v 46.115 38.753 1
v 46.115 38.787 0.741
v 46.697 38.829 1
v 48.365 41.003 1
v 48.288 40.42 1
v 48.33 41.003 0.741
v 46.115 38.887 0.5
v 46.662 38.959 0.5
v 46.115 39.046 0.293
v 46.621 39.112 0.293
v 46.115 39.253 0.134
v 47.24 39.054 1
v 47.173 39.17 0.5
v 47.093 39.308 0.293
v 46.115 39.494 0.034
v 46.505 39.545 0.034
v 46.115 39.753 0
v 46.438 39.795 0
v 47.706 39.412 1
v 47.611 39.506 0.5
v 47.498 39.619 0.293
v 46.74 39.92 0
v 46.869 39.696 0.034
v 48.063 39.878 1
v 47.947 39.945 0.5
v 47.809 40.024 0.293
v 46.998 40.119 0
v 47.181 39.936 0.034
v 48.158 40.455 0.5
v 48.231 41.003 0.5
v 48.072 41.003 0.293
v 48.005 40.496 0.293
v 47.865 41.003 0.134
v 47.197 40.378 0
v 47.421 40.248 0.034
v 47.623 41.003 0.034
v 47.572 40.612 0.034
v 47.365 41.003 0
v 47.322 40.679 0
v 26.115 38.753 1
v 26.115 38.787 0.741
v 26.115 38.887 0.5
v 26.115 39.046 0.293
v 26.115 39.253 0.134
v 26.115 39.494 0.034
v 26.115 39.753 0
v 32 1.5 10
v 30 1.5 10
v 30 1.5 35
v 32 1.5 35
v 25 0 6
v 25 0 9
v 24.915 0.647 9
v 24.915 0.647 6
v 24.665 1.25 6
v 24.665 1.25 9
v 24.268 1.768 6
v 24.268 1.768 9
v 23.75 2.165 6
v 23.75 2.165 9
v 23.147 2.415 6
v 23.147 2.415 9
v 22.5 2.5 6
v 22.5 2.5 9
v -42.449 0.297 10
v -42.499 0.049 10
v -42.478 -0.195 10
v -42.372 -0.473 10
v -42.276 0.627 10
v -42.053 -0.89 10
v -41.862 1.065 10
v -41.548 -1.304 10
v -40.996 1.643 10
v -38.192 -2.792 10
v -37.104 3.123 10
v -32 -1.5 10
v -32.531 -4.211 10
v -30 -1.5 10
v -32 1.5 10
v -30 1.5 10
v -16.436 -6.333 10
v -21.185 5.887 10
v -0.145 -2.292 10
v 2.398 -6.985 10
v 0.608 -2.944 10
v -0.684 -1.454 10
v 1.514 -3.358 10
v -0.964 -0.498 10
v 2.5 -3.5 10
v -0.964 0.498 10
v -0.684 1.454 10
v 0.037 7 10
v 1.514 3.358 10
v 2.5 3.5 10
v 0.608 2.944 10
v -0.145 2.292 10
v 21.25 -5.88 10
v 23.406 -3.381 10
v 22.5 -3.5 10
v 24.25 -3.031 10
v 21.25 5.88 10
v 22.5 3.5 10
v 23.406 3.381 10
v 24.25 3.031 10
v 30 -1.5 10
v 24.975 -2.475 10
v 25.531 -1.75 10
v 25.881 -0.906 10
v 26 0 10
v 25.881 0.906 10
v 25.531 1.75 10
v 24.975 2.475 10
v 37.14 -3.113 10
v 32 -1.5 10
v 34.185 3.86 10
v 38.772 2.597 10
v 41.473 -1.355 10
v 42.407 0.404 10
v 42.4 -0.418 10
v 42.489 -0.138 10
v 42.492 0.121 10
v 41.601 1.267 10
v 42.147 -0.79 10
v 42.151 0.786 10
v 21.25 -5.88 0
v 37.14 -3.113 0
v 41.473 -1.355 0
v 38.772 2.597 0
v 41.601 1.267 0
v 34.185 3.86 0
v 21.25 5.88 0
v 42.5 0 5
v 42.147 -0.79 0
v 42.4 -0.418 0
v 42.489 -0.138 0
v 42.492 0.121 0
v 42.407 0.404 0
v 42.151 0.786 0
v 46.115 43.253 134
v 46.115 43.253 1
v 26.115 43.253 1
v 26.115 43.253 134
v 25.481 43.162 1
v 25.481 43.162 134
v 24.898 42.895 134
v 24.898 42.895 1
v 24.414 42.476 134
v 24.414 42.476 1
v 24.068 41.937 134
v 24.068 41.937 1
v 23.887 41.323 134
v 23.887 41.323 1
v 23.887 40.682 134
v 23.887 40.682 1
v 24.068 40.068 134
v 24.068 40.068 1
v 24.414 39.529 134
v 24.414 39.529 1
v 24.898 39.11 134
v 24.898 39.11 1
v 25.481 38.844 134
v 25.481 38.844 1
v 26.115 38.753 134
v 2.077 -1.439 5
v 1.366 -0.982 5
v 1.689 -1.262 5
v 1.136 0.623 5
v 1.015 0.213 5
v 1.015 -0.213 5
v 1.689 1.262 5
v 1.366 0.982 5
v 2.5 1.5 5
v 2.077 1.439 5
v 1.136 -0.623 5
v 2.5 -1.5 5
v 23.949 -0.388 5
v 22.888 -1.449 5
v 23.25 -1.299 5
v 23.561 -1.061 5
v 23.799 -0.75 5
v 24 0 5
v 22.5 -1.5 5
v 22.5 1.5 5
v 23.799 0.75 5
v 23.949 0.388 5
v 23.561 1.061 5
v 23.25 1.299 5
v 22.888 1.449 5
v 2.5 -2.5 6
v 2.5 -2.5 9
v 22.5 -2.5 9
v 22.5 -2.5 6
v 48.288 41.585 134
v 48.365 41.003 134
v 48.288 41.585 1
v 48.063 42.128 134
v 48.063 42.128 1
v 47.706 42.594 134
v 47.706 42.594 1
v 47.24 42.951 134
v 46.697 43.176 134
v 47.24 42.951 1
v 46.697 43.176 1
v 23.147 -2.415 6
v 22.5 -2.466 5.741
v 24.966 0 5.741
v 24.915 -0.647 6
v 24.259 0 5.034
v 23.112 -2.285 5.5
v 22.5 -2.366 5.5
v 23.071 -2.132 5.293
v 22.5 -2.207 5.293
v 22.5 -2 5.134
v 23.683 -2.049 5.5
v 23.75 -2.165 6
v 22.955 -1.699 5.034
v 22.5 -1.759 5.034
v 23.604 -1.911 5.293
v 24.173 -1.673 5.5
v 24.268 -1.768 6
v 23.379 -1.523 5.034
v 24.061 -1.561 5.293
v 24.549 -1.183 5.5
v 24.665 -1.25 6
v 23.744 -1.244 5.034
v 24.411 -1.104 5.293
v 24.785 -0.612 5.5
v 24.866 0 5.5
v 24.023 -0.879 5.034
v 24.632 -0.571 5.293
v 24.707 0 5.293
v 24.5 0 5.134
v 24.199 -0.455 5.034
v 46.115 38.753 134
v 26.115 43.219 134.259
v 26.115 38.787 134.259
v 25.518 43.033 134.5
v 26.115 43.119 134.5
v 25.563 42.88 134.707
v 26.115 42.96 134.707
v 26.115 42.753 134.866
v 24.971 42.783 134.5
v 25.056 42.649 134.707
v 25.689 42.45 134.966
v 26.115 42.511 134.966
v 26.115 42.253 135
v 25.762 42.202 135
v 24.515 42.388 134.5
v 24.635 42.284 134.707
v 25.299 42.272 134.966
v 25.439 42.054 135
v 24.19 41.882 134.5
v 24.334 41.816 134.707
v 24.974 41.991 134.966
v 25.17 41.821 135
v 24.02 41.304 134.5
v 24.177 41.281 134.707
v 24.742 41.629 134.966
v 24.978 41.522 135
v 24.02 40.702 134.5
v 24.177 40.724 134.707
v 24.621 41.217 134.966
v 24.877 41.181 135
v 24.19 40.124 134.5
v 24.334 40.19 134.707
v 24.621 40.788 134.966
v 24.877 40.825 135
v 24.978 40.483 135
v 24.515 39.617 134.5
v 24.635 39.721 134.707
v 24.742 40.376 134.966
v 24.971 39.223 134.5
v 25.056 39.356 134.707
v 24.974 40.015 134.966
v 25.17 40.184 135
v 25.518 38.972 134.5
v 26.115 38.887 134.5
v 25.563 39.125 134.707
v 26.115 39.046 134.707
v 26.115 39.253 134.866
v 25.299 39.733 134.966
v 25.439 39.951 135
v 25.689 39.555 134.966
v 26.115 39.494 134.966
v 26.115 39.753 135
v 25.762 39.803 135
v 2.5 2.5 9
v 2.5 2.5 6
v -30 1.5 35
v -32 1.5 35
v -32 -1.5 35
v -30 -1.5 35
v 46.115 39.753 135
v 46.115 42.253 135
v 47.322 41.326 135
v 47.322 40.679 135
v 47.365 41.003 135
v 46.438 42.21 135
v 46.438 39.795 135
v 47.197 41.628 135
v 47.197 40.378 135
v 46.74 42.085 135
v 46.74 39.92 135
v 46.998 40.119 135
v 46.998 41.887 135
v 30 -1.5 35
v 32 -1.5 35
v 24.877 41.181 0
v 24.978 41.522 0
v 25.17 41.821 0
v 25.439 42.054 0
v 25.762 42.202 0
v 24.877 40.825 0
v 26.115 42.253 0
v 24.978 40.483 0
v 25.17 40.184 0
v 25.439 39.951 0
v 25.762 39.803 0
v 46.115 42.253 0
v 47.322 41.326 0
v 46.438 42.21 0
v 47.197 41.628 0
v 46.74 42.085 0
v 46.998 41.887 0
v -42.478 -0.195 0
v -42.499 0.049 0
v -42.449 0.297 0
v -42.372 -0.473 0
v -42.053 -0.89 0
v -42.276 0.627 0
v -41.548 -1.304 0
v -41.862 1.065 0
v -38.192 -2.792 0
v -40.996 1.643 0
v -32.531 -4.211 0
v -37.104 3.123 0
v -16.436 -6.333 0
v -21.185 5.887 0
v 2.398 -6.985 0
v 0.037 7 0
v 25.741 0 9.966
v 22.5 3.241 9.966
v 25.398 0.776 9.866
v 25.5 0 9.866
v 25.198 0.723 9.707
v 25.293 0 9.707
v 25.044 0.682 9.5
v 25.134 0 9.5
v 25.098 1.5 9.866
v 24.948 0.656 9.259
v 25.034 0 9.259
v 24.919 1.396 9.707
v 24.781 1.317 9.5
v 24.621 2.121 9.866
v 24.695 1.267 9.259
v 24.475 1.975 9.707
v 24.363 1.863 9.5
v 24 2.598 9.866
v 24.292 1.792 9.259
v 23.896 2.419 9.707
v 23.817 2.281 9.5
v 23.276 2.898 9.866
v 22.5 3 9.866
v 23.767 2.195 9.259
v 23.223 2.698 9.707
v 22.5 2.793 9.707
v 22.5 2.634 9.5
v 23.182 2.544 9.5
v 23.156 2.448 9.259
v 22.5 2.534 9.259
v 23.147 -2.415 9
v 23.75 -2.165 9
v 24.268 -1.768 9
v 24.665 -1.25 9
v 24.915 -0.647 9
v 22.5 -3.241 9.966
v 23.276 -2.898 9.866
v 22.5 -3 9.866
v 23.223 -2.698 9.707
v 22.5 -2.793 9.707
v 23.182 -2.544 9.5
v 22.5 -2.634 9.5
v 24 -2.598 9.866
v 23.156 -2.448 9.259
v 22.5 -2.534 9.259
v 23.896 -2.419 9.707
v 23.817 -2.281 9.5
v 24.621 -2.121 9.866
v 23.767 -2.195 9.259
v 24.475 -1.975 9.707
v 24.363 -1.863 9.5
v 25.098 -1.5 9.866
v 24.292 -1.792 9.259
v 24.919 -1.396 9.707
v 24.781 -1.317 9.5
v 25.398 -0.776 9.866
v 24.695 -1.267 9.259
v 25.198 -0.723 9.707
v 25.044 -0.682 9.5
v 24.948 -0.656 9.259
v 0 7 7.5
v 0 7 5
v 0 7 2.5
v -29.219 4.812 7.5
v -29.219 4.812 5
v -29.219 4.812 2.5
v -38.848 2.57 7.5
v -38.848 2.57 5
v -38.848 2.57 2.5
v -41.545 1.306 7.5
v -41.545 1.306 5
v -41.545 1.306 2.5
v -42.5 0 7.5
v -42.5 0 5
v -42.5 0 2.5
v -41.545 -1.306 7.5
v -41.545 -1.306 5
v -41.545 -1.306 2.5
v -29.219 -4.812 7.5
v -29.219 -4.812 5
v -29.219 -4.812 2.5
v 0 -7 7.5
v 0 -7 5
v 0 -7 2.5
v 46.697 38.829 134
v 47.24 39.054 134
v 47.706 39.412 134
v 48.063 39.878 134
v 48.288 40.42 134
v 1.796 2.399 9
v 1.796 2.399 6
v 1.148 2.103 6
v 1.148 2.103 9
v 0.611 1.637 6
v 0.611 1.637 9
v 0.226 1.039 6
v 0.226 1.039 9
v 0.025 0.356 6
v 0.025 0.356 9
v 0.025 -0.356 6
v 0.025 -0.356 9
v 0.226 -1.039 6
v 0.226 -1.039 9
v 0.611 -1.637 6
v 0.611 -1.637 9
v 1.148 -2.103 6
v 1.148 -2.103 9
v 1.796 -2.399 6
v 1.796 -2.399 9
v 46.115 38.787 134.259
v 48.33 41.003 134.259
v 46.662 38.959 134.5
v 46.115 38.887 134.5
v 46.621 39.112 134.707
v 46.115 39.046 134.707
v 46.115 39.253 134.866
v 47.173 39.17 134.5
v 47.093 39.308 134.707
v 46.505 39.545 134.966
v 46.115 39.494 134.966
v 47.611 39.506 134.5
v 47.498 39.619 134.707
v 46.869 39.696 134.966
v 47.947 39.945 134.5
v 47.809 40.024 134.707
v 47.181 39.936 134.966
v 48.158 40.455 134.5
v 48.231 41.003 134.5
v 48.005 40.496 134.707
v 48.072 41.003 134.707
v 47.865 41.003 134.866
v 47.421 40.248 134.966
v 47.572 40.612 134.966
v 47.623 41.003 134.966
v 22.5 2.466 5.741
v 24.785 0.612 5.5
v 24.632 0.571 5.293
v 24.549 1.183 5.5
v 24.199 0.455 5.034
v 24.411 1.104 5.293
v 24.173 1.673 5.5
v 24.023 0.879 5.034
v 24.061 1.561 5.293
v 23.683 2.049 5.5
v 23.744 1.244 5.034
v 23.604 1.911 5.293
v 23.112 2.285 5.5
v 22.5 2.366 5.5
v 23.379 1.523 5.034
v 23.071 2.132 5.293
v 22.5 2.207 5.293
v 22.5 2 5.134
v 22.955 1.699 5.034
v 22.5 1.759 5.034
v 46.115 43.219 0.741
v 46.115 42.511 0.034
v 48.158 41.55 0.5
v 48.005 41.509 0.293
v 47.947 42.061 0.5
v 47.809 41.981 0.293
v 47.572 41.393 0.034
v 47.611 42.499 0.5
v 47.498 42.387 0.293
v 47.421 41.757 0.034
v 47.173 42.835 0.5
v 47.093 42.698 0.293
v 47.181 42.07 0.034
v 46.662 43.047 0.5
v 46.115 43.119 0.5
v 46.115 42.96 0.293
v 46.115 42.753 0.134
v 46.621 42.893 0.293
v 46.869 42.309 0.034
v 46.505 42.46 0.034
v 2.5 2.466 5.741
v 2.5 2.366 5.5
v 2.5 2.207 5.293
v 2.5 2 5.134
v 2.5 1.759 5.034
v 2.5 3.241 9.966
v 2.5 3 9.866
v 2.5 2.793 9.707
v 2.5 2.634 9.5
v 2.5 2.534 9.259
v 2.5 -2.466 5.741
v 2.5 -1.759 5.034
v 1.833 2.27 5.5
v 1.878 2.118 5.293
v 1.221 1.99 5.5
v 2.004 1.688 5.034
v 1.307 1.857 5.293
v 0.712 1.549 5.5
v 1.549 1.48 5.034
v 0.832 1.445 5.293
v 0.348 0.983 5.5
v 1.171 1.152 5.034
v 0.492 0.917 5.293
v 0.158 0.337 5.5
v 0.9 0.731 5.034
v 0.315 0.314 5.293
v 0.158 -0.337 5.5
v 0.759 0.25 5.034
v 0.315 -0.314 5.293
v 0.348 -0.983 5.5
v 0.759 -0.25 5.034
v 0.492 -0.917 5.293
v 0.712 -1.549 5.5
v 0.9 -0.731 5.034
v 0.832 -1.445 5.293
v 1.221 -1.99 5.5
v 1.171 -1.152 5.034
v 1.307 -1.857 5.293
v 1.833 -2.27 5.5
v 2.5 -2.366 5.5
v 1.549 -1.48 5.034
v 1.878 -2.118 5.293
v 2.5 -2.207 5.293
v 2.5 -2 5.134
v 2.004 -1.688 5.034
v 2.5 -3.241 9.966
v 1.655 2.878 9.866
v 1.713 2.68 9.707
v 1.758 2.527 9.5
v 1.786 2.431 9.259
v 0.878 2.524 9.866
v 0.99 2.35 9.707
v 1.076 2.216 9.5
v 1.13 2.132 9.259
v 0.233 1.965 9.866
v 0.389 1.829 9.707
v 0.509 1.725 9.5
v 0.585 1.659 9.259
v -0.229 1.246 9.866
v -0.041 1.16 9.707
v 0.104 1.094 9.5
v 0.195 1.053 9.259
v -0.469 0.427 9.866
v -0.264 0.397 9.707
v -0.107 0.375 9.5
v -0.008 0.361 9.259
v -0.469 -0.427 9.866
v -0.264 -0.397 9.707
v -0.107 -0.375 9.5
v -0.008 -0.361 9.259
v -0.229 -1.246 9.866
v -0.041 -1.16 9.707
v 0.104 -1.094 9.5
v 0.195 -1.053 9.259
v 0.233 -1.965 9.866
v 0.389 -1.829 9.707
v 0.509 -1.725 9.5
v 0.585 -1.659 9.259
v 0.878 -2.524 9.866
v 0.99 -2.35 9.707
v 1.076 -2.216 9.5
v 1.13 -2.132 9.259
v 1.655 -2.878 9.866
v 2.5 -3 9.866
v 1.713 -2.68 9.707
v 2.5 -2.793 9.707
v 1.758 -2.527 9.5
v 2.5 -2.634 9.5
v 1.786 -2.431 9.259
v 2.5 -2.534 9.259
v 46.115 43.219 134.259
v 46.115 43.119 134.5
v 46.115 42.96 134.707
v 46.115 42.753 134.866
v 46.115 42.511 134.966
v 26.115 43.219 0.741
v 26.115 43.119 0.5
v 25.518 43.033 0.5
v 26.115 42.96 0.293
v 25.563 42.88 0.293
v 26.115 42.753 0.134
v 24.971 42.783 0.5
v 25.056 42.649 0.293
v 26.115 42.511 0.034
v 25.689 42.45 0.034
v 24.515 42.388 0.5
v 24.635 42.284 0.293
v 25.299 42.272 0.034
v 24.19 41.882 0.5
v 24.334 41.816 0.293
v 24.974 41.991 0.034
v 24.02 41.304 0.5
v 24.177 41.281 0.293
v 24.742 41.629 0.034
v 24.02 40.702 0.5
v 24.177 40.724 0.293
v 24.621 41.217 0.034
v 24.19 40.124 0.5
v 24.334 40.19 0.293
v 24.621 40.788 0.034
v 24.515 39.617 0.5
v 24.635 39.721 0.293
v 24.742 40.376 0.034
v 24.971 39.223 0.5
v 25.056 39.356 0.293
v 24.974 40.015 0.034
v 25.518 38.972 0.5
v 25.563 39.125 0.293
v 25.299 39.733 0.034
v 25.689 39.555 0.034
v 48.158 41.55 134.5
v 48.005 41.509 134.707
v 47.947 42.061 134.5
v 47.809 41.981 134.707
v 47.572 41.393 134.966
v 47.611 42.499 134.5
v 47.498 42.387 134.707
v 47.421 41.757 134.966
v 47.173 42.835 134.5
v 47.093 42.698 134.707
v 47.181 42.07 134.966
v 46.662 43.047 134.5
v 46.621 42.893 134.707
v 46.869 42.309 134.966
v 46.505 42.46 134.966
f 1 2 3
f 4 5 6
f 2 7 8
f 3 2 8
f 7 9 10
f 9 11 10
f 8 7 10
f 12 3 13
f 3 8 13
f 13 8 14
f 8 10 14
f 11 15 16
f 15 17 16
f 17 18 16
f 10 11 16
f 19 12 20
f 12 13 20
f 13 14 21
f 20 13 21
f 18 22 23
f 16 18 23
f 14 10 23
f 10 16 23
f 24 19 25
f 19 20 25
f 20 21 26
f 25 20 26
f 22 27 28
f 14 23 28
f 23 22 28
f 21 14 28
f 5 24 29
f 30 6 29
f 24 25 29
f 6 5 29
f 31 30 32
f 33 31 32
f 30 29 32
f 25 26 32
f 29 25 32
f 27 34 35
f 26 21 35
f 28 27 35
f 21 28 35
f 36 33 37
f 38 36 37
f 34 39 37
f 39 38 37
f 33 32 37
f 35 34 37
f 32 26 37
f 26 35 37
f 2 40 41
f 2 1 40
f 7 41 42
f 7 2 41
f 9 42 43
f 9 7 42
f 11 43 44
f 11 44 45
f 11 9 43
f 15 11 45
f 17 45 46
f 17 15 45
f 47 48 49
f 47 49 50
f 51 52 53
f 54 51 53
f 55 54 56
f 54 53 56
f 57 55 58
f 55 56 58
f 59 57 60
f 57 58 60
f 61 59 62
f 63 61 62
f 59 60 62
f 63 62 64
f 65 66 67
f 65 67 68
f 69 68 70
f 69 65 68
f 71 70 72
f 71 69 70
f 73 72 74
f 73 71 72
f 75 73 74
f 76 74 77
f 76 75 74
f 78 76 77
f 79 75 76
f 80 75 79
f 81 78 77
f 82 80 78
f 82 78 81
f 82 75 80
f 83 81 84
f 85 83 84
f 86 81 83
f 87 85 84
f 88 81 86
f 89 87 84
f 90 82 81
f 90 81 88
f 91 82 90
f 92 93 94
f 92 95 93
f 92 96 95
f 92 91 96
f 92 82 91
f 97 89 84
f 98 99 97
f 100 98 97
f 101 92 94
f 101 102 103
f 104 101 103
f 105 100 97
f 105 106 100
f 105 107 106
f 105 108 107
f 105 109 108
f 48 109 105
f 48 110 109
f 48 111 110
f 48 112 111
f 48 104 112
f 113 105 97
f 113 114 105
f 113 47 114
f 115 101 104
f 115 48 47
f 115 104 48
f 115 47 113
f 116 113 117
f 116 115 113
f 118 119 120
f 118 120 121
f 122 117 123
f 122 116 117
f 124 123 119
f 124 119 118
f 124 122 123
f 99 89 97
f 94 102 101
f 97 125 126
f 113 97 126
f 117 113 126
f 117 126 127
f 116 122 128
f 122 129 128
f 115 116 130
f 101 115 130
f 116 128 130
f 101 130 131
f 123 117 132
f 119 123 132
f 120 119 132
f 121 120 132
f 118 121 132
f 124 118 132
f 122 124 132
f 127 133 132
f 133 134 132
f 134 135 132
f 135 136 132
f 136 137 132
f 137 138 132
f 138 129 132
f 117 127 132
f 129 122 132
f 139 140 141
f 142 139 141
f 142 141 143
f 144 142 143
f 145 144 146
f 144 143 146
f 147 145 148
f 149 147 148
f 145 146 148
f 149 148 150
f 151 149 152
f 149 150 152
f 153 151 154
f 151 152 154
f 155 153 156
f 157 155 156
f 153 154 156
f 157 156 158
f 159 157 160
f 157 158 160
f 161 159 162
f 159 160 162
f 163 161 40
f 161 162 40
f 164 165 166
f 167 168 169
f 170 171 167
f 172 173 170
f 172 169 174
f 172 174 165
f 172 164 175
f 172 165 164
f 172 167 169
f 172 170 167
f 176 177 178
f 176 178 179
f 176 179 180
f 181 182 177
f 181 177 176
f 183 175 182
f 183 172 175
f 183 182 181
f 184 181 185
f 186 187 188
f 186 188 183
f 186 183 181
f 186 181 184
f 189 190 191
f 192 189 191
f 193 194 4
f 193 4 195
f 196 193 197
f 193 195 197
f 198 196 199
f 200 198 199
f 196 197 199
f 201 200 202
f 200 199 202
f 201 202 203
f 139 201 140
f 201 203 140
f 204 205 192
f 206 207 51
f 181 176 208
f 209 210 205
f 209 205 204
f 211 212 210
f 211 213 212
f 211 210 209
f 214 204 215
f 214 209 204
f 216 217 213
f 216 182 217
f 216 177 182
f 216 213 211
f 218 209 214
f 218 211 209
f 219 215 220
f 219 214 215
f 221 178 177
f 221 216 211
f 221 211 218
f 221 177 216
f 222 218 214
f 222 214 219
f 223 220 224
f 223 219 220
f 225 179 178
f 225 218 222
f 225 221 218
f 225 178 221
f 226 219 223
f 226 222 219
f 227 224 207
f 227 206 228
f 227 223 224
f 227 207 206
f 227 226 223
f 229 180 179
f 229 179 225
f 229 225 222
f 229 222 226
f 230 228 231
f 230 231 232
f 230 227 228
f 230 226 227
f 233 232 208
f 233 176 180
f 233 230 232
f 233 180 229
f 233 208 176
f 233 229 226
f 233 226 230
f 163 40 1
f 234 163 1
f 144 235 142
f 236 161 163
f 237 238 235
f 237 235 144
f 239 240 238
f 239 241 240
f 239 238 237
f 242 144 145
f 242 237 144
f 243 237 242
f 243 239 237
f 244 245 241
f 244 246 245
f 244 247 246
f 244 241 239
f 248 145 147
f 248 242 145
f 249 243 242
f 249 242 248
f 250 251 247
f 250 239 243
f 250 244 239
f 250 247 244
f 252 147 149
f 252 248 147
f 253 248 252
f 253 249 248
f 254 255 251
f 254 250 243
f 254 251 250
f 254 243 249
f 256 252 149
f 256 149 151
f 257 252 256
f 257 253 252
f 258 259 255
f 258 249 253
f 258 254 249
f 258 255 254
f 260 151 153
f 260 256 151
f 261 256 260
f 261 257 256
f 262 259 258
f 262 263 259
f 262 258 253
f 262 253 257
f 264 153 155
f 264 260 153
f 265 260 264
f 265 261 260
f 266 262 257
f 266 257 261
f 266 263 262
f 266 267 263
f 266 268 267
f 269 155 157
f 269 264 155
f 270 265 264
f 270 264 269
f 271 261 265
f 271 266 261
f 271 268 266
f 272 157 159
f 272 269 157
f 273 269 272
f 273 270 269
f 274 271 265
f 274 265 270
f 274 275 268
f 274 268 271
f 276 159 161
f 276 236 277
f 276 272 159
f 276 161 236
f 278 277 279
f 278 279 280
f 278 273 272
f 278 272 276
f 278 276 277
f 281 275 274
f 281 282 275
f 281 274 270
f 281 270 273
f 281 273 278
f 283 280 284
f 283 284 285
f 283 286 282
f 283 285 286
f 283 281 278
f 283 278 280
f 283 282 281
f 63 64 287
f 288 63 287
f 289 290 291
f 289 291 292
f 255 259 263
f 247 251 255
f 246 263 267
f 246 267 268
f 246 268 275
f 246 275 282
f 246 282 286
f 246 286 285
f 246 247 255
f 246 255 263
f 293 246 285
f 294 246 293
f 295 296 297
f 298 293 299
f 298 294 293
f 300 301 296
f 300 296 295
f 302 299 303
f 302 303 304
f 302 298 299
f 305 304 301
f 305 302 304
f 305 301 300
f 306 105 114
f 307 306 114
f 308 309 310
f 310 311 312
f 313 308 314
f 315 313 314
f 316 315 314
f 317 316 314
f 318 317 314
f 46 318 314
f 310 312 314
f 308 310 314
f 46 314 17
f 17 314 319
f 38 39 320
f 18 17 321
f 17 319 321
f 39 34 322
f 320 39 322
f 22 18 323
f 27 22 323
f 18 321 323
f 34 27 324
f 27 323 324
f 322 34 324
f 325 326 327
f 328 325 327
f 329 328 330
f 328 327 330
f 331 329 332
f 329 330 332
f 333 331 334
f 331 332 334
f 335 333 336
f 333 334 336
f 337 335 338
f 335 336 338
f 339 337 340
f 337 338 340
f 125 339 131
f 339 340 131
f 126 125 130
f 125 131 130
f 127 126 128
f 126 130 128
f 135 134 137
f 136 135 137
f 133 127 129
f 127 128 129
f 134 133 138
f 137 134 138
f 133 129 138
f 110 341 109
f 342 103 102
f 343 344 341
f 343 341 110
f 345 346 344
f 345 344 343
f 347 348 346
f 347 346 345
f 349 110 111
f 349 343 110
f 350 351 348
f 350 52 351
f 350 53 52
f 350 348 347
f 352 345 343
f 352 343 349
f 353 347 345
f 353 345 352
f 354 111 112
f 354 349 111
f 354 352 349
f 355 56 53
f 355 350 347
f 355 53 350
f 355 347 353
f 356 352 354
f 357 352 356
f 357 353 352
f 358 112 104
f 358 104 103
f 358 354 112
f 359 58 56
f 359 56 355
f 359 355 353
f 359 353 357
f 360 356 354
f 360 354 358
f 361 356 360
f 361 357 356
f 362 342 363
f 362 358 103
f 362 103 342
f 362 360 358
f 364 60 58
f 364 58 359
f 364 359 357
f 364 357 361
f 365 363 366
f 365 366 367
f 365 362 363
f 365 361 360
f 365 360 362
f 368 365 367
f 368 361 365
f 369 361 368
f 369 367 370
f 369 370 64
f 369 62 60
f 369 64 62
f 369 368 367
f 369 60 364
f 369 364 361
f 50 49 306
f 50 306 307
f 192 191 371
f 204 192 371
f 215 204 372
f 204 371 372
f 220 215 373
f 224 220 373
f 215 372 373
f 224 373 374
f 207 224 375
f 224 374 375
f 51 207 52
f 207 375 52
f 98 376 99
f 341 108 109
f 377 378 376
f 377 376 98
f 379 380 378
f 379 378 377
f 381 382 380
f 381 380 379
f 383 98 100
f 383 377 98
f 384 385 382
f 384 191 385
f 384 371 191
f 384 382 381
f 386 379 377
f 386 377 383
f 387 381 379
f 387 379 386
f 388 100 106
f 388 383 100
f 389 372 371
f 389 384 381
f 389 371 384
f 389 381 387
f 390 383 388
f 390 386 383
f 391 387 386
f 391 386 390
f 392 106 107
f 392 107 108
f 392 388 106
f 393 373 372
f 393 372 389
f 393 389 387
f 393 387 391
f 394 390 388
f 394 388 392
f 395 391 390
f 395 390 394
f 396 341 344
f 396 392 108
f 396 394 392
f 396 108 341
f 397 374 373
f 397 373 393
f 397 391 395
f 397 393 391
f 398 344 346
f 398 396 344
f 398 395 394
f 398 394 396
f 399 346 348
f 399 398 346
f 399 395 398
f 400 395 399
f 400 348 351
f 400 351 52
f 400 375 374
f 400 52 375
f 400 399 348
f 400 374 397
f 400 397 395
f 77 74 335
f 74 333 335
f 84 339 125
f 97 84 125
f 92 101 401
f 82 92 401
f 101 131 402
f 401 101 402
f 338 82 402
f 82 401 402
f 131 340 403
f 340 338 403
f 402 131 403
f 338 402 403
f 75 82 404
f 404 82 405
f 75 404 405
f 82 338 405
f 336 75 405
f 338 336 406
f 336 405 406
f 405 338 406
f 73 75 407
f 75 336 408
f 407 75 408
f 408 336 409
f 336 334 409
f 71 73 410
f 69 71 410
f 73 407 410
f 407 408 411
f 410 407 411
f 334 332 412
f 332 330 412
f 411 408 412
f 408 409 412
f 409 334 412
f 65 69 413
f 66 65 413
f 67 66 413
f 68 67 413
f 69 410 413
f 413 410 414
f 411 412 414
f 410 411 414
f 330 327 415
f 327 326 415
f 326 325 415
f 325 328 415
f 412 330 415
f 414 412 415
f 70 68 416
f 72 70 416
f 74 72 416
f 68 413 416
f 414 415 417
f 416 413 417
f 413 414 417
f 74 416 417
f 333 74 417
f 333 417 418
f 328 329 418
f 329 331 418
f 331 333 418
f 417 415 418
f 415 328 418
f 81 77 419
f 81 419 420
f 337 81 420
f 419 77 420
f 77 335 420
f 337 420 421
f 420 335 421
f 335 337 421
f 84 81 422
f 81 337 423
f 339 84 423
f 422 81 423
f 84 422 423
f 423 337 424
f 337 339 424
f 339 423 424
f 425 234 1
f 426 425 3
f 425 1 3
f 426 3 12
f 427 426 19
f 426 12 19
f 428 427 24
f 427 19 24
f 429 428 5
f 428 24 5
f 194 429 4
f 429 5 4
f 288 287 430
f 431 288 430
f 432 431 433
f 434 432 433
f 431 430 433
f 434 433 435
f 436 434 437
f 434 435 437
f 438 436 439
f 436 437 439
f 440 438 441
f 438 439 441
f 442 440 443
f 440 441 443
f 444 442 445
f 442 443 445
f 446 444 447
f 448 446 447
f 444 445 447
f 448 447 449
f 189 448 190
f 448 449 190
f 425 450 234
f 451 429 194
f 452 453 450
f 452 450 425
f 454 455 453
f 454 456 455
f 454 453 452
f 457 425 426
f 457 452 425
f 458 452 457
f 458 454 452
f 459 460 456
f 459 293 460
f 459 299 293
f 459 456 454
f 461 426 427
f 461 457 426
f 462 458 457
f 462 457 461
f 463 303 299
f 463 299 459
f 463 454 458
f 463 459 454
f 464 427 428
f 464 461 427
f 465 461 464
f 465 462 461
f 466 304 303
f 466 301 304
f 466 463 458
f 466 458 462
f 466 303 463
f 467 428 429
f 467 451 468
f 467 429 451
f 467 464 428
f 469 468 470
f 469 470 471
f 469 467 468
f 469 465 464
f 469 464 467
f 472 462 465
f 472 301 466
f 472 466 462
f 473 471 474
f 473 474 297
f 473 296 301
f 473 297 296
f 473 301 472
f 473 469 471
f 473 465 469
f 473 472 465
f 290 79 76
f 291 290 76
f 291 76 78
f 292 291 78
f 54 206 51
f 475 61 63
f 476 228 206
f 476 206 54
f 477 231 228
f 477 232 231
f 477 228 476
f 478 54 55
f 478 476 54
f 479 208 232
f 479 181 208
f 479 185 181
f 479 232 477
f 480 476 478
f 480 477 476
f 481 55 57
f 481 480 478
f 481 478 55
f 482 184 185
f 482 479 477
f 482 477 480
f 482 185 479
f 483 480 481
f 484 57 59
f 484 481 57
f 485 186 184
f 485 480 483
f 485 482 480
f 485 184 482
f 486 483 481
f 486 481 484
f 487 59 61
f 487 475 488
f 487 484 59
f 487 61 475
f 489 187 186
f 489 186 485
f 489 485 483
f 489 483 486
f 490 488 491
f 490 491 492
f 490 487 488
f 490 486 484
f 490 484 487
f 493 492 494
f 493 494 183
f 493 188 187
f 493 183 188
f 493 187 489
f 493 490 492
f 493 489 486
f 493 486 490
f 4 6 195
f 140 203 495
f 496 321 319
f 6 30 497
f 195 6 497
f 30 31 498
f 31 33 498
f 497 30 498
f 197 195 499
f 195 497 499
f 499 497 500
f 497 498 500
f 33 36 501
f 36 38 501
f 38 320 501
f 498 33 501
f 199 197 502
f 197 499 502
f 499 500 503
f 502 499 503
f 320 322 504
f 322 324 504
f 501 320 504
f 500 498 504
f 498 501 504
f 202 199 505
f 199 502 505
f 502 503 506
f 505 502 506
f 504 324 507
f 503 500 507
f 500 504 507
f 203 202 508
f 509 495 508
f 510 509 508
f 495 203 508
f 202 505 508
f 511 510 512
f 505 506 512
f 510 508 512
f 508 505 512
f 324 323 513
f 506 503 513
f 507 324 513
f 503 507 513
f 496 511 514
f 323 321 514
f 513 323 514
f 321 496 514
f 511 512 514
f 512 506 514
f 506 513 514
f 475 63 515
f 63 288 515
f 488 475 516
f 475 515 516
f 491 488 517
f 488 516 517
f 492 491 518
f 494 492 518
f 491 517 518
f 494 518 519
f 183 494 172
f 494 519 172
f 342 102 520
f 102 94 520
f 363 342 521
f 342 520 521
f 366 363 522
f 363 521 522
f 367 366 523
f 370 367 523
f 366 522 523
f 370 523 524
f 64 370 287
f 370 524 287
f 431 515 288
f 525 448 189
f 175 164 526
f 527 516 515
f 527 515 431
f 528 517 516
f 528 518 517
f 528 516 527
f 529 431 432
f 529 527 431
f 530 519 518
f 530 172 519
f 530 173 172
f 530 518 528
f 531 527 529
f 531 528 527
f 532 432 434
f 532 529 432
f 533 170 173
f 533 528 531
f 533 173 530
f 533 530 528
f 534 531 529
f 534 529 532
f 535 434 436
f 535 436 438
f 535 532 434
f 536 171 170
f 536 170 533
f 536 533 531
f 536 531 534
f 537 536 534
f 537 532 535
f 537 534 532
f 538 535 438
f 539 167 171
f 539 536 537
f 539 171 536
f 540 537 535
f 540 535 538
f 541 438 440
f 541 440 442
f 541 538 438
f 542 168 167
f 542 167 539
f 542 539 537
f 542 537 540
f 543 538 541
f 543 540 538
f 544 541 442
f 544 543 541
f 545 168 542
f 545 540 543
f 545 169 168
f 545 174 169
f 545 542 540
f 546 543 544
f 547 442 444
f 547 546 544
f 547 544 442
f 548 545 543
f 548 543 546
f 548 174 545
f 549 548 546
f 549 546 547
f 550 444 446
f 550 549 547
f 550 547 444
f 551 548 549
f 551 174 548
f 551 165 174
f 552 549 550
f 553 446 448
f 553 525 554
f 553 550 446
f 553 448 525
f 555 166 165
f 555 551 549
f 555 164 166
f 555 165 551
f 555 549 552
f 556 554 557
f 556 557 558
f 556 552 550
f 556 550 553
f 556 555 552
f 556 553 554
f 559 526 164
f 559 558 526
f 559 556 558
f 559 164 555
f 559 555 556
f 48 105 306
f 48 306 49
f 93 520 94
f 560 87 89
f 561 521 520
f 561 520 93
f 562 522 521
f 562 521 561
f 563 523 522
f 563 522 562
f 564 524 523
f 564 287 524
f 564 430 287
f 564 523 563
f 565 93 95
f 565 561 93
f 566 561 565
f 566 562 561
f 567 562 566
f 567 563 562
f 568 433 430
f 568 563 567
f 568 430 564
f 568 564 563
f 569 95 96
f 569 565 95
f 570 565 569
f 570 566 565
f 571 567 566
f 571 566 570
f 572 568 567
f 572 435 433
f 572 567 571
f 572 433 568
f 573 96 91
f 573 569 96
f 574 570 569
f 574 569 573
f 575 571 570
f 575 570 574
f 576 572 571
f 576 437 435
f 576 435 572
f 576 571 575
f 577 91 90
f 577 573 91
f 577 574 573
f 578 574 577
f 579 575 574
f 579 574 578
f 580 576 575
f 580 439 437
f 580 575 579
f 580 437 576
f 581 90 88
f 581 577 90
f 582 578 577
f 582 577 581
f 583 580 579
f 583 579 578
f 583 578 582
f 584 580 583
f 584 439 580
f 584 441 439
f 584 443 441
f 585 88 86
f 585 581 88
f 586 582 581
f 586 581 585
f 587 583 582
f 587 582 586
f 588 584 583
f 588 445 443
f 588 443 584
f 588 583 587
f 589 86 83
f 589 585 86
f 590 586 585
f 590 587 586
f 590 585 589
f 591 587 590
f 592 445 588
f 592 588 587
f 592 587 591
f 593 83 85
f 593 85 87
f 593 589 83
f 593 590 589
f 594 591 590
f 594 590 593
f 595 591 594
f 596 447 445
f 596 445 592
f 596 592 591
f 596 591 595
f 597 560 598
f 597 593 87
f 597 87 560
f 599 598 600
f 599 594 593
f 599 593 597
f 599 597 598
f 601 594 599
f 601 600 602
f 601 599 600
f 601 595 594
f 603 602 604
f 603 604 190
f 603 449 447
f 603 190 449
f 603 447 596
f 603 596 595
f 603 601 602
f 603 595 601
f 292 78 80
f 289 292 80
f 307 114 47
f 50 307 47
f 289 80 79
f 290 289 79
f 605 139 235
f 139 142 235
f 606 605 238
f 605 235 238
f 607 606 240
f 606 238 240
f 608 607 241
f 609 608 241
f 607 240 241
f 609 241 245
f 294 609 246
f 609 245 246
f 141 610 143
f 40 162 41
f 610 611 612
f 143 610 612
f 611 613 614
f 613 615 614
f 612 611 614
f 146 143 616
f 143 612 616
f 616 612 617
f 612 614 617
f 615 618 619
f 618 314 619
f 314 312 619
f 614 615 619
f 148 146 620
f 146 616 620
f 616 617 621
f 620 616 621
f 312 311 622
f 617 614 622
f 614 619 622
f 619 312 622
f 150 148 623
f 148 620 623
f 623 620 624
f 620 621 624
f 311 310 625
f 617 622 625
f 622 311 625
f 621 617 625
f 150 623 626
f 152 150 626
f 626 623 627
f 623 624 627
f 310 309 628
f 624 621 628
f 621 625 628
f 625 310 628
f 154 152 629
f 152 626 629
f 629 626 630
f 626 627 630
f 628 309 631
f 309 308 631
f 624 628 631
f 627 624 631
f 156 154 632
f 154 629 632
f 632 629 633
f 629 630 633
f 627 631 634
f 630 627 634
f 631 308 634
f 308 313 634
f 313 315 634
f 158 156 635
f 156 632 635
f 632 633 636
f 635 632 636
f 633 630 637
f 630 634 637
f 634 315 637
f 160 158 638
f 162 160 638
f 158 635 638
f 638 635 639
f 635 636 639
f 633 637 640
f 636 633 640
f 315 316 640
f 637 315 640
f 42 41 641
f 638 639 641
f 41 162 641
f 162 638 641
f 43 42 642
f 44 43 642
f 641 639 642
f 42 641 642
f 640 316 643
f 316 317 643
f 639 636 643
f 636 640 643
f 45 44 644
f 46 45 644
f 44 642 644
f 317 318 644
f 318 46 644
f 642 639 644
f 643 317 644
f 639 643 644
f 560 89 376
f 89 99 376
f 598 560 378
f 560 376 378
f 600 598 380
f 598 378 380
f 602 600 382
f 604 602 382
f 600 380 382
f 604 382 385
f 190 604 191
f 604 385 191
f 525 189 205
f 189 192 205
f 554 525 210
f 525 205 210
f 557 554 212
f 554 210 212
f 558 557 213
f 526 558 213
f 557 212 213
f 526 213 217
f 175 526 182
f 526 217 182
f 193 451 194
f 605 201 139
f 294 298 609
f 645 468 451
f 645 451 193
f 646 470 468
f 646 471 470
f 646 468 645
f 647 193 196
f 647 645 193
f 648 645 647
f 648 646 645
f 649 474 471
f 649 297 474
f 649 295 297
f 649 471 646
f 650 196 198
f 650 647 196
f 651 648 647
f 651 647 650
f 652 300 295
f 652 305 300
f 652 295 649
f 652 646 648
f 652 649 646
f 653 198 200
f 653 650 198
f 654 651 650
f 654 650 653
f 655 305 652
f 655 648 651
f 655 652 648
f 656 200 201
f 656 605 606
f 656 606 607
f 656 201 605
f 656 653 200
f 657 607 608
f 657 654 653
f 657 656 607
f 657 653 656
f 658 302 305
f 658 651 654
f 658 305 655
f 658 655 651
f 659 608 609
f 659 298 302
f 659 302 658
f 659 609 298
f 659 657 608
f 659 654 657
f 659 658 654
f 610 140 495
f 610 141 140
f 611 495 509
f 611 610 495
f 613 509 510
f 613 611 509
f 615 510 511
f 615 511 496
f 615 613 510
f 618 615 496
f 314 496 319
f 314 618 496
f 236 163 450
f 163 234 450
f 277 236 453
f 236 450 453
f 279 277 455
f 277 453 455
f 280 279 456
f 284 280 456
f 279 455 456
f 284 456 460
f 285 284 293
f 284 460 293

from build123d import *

# Parameters (mm, degrees)
F1_DEPTH = 135
F2_R     = 1
F4_DEPTH = 10
F6_DEPTH = 5
F7_R     = 1
F8_W     = 2
F8_H     = 3
F9_DEPTH = 25


with BuildPart() as f1:
    # F0 (on Top) → F1 (new body)
    with BuildSketch(Plane.XY):
        with BuildLine():
            ThreePointArc((26.114552, 38.752655), (27.705542, 39.411665), (28.364552, 41.002655))
            ThreePointArc((28.364552, 41.002655), (27.705542, 42.593645), (26.114552, 43.252655))
            ThreePointArc((26.114552, 43.252655), (23.864552, 41.002655), (26.114552, 38.752655))
        make_face()
        with BuildLine():
            ThreePointArc((26.114552, 43.252655), (27.705542, 42.593645), (28.364552, 41.002655))
            ThreePointArc((28.364552, 41.002655), (27.705542, 39.411665), (26.114552, 38.752655))
            Line((26.114552, 38.752655), (46.114552, 38.752655))
            ThreePointArc((46.114552, 38.752655), (43.864552, 41.002655), (46.114552, 43.252655))
            Line((46.114552, 43.252655), (26.114552, 43.252655))
        make_face()
        with BuildLine():
            ThreePointArc((48.364552, 41.002655), (47.705542, 42.593645), (46.114552, 43.252655))
            ThreePointArc((46.114552, 43.252655), (43.864552, 41.002655), (46.114552, 38.752655))
            ThreePointArc((46.114552, 38.752655), (47.705542, 39.411665), (48.364552, 41.002655))
        make_face()
    extrude(amount=F1_DEPTH)

    # F2
    f2_edges = [f1.edges().sort_by_distance(p)[0] for p in [
        (23.864552, 41.002655, 0),
        (36.114552, 38.752655, 0),
        (48.364552, 41.002655, 0),
        (36.114552, 43.252655, 0),
        (23.864552, 41.002655, 135),
        (36.114552, 38.752655, 135),
        (48.364552, 41.002655, 135),
        (36.114552, 43.252655, 135),
    ]]
    fillet(f2_edges, radius=F2_R)


with BuildPart() as f4:
    # F3 (on Top) → F4 (new body)
    with BuildSketch(Plane.XY):
        with BuildLine():
            Line((0, 0), (0, -7))
            add(Edge.make_bspline(
                [(0, -7), (7.380048, -7), (14.760095, -6.577848), (21.25, -5.880157)],
                knots=[0, 0, 0, 0, 14.958962, 14.958962, 14.958962, 14.958962], degree=3))
            Line((21.25, -5.880157), (21.25, 0))
            Line((21.25, 0), (0, 0))
        make_face()
        with BuildLine():
            add(Edge.make_bspline(
                [(0, -7), (-21.25, -7), (-63.75, 0), (-21.25, 7), (0, 7)],
                knots=[0, 0, 0, 0, 43.072613, 86.145226, 86.145226, 86.145226, 86.145226], degree=3))
            Line((0, -7), (0, 0))
            Line((0, 0), (0, 7))
        make_face()
        with BuildLine():
            Line((21.25, 0), (21.25, -5.880157))
            add(Edge.make_bspline(
                [(21.25, -5.880157), (33.447031, -4.568926), (42.5, -2.284463), (42.5, 0)],
                knots=[14.958962, 14.958962, 14.958962, 14.958962, 43.072613, 43.072613, 43.072613, 43.072613], degree=3))
            Line((42.5, 0), (21.25, 0))
        make_face()
        with BuildLine():
            Line((0, 7), (0, 0))
            Line((0, 0), (21.25, 0))
            Line((21.25, 0), (21.25, 5.880157))
            add(Edge.make_bspline(
                [(21.25, 5.880157), (14.760095, 6.577848), (7.380048, 7), (0, 7)],
                knots=[71.186265, 71.186265, 71.186265, 71.186265, 86.145226, 86.145226, 86.145226, 86.145226], degree=3))
        make_face()
        with BuildLine():
            Line((21.25, 0), (42.5, 0))
            add(Edge.make_bspline(
                [(42.5, 0), (42.5, 2.284463), (33.447031, 4.568926), (21.25, 5.880157)],
                knots=[43.072613, 43.072613, 43.072613, 43.072613, 71.186265, 71.186265, 71.186265, 71.186265], degree=3))
            Line((21.25, 5.880157), (21.25, 0))
        make_face()
    extrude(amount=F4_DEPTH)

    # F5 (on face) → F6 (cut)
    with BuildSketch(Plane.XY.offset(10)):
        with BuildLine():
            ThreePointArc((2.5, -2.5), (4.267767, -1.767767), (5, 0))
            ThreePointArc((5, 0), (4.267767, 1.767767), (2.5, 2.5))
            ThreePointArc((2.5, 2.5), (0, 0), (2.5, -2.5))
        make_face()
        with BuildLine():
            ThreePointArc((2.5, 2.5), (4.267767, 1.767767), (5, 0))
            ThreePointArc((5, 0), (4.267767, -1.767767), (2.5, -2.5))
            Line((2.5, -2.5), (22.5, -2.5))
            ThreePointArc((22.5, -2.5), (20, 0), (22.5, 2.5))
            Line((22.5, 2.5), (2.5, 2.5))
        make_face()
        with BuildLine():
            ThreePointArc((25, 0), (24.267767, 1.767767), (22.5, 2.5))
            ThreePointArc((22.5, 2.5), (20, 0), (22.5, -2.5))
            ThreePointArc((22.5, -2.5), (24.267767, -1.767767), (25, 0))
        make_face()
    extrude(amount=-F6_DEPTH, mode=Mode.SUBTRACT)

    # F7
    f7_edges = [f4.edges().sort_by_distance(p)[0] for p in [
        (0, 0, 5),
        (12.5, -2.5, 5),
        (25, 0, 5),
        (12.5, 2.5, 5),
        (0, 0, 10),
    ]]
    fillet(f7_edges, radius=F7_R)

    # F8 (on face) → F9 (join)
    with BuildSketch(Plane.XY.offset(10)):
        Polygon((-32, 1.5), (-32, -1.5), (-30, -1.5), (-30, 0), (-30, 1.5), align=None)
        with Locations((31, 0)):
            Rectangle(F8_W, F8_H)
    extrude(amount=F9_DEPTH)


solid = Compound([f1.part, f4.part])
